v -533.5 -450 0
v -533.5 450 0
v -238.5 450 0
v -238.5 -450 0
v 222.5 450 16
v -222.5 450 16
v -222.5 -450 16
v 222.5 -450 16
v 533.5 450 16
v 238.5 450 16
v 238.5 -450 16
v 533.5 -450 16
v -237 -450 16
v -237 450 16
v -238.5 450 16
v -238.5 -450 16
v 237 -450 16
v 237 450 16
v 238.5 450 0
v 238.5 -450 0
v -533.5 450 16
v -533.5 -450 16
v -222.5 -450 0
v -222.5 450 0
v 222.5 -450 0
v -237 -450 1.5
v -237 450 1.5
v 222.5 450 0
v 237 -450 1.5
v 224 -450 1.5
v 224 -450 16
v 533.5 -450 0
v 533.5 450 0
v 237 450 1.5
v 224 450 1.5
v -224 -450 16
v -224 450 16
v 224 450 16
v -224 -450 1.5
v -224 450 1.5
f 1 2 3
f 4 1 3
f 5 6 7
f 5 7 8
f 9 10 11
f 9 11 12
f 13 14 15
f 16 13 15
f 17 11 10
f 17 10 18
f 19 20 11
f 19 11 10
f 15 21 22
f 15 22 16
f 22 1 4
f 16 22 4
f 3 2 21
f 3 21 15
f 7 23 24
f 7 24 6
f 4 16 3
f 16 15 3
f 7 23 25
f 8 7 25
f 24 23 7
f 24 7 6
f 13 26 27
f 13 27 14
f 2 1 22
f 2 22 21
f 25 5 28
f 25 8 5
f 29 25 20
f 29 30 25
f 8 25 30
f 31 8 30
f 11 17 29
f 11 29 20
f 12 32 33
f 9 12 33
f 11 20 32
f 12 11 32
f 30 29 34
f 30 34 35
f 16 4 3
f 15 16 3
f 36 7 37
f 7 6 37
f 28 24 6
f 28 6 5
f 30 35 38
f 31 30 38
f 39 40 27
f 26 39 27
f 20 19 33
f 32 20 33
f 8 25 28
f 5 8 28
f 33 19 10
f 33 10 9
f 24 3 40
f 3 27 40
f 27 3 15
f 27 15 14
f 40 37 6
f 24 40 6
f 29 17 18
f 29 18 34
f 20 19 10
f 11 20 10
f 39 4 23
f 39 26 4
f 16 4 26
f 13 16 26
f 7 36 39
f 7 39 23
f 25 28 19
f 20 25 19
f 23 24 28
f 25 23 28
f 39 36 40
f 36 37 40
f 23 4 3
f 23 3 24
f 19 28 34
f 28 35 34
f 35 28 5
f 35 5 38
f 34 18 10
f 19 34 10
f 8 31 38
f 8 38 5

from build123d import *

# Parameters (mm, degrees)
F0_W     = 295
F0_H     = 900
F0_W_2   = 445
F1_DEPTH = 16
F3_DEPTH = 450


with BuildPart() as f1:
    # F0 (on Top) → F1 (new body)
    with BuildSketch(Plane.XY):
        with Locations((-386, 0)):
            Rectangle(F0_W, F0_H)
        Rectangle(F0_W_2, F0_H)
        with Locations((386, 0)):
            Rectangle(F0_W, F0_H)
    extrude(amount=F1_DEPTH)


with BuildPart() as f3:
    # F2 (on Front) → F3 (new body, symmetric)
    with BuildSketch(Plane.XZ):
        Polygon((-237, 16), (-238.5, 16), (-238.5, 0), (-222.5, 0), (-222.5, 16), (-224, 16), (-224, 1.5), (-237, 1.5), align=None)
        Polygon((238.5, 0), (238.5, 16), (237, 16), (237, 1.5), (224, 1.5), (224, 16), (222.5, 16), (222.5, 0), align=None)
    extrude(amount=F3_DEPTH, both=True)


solid = Compound([f1.part, f3.part])
